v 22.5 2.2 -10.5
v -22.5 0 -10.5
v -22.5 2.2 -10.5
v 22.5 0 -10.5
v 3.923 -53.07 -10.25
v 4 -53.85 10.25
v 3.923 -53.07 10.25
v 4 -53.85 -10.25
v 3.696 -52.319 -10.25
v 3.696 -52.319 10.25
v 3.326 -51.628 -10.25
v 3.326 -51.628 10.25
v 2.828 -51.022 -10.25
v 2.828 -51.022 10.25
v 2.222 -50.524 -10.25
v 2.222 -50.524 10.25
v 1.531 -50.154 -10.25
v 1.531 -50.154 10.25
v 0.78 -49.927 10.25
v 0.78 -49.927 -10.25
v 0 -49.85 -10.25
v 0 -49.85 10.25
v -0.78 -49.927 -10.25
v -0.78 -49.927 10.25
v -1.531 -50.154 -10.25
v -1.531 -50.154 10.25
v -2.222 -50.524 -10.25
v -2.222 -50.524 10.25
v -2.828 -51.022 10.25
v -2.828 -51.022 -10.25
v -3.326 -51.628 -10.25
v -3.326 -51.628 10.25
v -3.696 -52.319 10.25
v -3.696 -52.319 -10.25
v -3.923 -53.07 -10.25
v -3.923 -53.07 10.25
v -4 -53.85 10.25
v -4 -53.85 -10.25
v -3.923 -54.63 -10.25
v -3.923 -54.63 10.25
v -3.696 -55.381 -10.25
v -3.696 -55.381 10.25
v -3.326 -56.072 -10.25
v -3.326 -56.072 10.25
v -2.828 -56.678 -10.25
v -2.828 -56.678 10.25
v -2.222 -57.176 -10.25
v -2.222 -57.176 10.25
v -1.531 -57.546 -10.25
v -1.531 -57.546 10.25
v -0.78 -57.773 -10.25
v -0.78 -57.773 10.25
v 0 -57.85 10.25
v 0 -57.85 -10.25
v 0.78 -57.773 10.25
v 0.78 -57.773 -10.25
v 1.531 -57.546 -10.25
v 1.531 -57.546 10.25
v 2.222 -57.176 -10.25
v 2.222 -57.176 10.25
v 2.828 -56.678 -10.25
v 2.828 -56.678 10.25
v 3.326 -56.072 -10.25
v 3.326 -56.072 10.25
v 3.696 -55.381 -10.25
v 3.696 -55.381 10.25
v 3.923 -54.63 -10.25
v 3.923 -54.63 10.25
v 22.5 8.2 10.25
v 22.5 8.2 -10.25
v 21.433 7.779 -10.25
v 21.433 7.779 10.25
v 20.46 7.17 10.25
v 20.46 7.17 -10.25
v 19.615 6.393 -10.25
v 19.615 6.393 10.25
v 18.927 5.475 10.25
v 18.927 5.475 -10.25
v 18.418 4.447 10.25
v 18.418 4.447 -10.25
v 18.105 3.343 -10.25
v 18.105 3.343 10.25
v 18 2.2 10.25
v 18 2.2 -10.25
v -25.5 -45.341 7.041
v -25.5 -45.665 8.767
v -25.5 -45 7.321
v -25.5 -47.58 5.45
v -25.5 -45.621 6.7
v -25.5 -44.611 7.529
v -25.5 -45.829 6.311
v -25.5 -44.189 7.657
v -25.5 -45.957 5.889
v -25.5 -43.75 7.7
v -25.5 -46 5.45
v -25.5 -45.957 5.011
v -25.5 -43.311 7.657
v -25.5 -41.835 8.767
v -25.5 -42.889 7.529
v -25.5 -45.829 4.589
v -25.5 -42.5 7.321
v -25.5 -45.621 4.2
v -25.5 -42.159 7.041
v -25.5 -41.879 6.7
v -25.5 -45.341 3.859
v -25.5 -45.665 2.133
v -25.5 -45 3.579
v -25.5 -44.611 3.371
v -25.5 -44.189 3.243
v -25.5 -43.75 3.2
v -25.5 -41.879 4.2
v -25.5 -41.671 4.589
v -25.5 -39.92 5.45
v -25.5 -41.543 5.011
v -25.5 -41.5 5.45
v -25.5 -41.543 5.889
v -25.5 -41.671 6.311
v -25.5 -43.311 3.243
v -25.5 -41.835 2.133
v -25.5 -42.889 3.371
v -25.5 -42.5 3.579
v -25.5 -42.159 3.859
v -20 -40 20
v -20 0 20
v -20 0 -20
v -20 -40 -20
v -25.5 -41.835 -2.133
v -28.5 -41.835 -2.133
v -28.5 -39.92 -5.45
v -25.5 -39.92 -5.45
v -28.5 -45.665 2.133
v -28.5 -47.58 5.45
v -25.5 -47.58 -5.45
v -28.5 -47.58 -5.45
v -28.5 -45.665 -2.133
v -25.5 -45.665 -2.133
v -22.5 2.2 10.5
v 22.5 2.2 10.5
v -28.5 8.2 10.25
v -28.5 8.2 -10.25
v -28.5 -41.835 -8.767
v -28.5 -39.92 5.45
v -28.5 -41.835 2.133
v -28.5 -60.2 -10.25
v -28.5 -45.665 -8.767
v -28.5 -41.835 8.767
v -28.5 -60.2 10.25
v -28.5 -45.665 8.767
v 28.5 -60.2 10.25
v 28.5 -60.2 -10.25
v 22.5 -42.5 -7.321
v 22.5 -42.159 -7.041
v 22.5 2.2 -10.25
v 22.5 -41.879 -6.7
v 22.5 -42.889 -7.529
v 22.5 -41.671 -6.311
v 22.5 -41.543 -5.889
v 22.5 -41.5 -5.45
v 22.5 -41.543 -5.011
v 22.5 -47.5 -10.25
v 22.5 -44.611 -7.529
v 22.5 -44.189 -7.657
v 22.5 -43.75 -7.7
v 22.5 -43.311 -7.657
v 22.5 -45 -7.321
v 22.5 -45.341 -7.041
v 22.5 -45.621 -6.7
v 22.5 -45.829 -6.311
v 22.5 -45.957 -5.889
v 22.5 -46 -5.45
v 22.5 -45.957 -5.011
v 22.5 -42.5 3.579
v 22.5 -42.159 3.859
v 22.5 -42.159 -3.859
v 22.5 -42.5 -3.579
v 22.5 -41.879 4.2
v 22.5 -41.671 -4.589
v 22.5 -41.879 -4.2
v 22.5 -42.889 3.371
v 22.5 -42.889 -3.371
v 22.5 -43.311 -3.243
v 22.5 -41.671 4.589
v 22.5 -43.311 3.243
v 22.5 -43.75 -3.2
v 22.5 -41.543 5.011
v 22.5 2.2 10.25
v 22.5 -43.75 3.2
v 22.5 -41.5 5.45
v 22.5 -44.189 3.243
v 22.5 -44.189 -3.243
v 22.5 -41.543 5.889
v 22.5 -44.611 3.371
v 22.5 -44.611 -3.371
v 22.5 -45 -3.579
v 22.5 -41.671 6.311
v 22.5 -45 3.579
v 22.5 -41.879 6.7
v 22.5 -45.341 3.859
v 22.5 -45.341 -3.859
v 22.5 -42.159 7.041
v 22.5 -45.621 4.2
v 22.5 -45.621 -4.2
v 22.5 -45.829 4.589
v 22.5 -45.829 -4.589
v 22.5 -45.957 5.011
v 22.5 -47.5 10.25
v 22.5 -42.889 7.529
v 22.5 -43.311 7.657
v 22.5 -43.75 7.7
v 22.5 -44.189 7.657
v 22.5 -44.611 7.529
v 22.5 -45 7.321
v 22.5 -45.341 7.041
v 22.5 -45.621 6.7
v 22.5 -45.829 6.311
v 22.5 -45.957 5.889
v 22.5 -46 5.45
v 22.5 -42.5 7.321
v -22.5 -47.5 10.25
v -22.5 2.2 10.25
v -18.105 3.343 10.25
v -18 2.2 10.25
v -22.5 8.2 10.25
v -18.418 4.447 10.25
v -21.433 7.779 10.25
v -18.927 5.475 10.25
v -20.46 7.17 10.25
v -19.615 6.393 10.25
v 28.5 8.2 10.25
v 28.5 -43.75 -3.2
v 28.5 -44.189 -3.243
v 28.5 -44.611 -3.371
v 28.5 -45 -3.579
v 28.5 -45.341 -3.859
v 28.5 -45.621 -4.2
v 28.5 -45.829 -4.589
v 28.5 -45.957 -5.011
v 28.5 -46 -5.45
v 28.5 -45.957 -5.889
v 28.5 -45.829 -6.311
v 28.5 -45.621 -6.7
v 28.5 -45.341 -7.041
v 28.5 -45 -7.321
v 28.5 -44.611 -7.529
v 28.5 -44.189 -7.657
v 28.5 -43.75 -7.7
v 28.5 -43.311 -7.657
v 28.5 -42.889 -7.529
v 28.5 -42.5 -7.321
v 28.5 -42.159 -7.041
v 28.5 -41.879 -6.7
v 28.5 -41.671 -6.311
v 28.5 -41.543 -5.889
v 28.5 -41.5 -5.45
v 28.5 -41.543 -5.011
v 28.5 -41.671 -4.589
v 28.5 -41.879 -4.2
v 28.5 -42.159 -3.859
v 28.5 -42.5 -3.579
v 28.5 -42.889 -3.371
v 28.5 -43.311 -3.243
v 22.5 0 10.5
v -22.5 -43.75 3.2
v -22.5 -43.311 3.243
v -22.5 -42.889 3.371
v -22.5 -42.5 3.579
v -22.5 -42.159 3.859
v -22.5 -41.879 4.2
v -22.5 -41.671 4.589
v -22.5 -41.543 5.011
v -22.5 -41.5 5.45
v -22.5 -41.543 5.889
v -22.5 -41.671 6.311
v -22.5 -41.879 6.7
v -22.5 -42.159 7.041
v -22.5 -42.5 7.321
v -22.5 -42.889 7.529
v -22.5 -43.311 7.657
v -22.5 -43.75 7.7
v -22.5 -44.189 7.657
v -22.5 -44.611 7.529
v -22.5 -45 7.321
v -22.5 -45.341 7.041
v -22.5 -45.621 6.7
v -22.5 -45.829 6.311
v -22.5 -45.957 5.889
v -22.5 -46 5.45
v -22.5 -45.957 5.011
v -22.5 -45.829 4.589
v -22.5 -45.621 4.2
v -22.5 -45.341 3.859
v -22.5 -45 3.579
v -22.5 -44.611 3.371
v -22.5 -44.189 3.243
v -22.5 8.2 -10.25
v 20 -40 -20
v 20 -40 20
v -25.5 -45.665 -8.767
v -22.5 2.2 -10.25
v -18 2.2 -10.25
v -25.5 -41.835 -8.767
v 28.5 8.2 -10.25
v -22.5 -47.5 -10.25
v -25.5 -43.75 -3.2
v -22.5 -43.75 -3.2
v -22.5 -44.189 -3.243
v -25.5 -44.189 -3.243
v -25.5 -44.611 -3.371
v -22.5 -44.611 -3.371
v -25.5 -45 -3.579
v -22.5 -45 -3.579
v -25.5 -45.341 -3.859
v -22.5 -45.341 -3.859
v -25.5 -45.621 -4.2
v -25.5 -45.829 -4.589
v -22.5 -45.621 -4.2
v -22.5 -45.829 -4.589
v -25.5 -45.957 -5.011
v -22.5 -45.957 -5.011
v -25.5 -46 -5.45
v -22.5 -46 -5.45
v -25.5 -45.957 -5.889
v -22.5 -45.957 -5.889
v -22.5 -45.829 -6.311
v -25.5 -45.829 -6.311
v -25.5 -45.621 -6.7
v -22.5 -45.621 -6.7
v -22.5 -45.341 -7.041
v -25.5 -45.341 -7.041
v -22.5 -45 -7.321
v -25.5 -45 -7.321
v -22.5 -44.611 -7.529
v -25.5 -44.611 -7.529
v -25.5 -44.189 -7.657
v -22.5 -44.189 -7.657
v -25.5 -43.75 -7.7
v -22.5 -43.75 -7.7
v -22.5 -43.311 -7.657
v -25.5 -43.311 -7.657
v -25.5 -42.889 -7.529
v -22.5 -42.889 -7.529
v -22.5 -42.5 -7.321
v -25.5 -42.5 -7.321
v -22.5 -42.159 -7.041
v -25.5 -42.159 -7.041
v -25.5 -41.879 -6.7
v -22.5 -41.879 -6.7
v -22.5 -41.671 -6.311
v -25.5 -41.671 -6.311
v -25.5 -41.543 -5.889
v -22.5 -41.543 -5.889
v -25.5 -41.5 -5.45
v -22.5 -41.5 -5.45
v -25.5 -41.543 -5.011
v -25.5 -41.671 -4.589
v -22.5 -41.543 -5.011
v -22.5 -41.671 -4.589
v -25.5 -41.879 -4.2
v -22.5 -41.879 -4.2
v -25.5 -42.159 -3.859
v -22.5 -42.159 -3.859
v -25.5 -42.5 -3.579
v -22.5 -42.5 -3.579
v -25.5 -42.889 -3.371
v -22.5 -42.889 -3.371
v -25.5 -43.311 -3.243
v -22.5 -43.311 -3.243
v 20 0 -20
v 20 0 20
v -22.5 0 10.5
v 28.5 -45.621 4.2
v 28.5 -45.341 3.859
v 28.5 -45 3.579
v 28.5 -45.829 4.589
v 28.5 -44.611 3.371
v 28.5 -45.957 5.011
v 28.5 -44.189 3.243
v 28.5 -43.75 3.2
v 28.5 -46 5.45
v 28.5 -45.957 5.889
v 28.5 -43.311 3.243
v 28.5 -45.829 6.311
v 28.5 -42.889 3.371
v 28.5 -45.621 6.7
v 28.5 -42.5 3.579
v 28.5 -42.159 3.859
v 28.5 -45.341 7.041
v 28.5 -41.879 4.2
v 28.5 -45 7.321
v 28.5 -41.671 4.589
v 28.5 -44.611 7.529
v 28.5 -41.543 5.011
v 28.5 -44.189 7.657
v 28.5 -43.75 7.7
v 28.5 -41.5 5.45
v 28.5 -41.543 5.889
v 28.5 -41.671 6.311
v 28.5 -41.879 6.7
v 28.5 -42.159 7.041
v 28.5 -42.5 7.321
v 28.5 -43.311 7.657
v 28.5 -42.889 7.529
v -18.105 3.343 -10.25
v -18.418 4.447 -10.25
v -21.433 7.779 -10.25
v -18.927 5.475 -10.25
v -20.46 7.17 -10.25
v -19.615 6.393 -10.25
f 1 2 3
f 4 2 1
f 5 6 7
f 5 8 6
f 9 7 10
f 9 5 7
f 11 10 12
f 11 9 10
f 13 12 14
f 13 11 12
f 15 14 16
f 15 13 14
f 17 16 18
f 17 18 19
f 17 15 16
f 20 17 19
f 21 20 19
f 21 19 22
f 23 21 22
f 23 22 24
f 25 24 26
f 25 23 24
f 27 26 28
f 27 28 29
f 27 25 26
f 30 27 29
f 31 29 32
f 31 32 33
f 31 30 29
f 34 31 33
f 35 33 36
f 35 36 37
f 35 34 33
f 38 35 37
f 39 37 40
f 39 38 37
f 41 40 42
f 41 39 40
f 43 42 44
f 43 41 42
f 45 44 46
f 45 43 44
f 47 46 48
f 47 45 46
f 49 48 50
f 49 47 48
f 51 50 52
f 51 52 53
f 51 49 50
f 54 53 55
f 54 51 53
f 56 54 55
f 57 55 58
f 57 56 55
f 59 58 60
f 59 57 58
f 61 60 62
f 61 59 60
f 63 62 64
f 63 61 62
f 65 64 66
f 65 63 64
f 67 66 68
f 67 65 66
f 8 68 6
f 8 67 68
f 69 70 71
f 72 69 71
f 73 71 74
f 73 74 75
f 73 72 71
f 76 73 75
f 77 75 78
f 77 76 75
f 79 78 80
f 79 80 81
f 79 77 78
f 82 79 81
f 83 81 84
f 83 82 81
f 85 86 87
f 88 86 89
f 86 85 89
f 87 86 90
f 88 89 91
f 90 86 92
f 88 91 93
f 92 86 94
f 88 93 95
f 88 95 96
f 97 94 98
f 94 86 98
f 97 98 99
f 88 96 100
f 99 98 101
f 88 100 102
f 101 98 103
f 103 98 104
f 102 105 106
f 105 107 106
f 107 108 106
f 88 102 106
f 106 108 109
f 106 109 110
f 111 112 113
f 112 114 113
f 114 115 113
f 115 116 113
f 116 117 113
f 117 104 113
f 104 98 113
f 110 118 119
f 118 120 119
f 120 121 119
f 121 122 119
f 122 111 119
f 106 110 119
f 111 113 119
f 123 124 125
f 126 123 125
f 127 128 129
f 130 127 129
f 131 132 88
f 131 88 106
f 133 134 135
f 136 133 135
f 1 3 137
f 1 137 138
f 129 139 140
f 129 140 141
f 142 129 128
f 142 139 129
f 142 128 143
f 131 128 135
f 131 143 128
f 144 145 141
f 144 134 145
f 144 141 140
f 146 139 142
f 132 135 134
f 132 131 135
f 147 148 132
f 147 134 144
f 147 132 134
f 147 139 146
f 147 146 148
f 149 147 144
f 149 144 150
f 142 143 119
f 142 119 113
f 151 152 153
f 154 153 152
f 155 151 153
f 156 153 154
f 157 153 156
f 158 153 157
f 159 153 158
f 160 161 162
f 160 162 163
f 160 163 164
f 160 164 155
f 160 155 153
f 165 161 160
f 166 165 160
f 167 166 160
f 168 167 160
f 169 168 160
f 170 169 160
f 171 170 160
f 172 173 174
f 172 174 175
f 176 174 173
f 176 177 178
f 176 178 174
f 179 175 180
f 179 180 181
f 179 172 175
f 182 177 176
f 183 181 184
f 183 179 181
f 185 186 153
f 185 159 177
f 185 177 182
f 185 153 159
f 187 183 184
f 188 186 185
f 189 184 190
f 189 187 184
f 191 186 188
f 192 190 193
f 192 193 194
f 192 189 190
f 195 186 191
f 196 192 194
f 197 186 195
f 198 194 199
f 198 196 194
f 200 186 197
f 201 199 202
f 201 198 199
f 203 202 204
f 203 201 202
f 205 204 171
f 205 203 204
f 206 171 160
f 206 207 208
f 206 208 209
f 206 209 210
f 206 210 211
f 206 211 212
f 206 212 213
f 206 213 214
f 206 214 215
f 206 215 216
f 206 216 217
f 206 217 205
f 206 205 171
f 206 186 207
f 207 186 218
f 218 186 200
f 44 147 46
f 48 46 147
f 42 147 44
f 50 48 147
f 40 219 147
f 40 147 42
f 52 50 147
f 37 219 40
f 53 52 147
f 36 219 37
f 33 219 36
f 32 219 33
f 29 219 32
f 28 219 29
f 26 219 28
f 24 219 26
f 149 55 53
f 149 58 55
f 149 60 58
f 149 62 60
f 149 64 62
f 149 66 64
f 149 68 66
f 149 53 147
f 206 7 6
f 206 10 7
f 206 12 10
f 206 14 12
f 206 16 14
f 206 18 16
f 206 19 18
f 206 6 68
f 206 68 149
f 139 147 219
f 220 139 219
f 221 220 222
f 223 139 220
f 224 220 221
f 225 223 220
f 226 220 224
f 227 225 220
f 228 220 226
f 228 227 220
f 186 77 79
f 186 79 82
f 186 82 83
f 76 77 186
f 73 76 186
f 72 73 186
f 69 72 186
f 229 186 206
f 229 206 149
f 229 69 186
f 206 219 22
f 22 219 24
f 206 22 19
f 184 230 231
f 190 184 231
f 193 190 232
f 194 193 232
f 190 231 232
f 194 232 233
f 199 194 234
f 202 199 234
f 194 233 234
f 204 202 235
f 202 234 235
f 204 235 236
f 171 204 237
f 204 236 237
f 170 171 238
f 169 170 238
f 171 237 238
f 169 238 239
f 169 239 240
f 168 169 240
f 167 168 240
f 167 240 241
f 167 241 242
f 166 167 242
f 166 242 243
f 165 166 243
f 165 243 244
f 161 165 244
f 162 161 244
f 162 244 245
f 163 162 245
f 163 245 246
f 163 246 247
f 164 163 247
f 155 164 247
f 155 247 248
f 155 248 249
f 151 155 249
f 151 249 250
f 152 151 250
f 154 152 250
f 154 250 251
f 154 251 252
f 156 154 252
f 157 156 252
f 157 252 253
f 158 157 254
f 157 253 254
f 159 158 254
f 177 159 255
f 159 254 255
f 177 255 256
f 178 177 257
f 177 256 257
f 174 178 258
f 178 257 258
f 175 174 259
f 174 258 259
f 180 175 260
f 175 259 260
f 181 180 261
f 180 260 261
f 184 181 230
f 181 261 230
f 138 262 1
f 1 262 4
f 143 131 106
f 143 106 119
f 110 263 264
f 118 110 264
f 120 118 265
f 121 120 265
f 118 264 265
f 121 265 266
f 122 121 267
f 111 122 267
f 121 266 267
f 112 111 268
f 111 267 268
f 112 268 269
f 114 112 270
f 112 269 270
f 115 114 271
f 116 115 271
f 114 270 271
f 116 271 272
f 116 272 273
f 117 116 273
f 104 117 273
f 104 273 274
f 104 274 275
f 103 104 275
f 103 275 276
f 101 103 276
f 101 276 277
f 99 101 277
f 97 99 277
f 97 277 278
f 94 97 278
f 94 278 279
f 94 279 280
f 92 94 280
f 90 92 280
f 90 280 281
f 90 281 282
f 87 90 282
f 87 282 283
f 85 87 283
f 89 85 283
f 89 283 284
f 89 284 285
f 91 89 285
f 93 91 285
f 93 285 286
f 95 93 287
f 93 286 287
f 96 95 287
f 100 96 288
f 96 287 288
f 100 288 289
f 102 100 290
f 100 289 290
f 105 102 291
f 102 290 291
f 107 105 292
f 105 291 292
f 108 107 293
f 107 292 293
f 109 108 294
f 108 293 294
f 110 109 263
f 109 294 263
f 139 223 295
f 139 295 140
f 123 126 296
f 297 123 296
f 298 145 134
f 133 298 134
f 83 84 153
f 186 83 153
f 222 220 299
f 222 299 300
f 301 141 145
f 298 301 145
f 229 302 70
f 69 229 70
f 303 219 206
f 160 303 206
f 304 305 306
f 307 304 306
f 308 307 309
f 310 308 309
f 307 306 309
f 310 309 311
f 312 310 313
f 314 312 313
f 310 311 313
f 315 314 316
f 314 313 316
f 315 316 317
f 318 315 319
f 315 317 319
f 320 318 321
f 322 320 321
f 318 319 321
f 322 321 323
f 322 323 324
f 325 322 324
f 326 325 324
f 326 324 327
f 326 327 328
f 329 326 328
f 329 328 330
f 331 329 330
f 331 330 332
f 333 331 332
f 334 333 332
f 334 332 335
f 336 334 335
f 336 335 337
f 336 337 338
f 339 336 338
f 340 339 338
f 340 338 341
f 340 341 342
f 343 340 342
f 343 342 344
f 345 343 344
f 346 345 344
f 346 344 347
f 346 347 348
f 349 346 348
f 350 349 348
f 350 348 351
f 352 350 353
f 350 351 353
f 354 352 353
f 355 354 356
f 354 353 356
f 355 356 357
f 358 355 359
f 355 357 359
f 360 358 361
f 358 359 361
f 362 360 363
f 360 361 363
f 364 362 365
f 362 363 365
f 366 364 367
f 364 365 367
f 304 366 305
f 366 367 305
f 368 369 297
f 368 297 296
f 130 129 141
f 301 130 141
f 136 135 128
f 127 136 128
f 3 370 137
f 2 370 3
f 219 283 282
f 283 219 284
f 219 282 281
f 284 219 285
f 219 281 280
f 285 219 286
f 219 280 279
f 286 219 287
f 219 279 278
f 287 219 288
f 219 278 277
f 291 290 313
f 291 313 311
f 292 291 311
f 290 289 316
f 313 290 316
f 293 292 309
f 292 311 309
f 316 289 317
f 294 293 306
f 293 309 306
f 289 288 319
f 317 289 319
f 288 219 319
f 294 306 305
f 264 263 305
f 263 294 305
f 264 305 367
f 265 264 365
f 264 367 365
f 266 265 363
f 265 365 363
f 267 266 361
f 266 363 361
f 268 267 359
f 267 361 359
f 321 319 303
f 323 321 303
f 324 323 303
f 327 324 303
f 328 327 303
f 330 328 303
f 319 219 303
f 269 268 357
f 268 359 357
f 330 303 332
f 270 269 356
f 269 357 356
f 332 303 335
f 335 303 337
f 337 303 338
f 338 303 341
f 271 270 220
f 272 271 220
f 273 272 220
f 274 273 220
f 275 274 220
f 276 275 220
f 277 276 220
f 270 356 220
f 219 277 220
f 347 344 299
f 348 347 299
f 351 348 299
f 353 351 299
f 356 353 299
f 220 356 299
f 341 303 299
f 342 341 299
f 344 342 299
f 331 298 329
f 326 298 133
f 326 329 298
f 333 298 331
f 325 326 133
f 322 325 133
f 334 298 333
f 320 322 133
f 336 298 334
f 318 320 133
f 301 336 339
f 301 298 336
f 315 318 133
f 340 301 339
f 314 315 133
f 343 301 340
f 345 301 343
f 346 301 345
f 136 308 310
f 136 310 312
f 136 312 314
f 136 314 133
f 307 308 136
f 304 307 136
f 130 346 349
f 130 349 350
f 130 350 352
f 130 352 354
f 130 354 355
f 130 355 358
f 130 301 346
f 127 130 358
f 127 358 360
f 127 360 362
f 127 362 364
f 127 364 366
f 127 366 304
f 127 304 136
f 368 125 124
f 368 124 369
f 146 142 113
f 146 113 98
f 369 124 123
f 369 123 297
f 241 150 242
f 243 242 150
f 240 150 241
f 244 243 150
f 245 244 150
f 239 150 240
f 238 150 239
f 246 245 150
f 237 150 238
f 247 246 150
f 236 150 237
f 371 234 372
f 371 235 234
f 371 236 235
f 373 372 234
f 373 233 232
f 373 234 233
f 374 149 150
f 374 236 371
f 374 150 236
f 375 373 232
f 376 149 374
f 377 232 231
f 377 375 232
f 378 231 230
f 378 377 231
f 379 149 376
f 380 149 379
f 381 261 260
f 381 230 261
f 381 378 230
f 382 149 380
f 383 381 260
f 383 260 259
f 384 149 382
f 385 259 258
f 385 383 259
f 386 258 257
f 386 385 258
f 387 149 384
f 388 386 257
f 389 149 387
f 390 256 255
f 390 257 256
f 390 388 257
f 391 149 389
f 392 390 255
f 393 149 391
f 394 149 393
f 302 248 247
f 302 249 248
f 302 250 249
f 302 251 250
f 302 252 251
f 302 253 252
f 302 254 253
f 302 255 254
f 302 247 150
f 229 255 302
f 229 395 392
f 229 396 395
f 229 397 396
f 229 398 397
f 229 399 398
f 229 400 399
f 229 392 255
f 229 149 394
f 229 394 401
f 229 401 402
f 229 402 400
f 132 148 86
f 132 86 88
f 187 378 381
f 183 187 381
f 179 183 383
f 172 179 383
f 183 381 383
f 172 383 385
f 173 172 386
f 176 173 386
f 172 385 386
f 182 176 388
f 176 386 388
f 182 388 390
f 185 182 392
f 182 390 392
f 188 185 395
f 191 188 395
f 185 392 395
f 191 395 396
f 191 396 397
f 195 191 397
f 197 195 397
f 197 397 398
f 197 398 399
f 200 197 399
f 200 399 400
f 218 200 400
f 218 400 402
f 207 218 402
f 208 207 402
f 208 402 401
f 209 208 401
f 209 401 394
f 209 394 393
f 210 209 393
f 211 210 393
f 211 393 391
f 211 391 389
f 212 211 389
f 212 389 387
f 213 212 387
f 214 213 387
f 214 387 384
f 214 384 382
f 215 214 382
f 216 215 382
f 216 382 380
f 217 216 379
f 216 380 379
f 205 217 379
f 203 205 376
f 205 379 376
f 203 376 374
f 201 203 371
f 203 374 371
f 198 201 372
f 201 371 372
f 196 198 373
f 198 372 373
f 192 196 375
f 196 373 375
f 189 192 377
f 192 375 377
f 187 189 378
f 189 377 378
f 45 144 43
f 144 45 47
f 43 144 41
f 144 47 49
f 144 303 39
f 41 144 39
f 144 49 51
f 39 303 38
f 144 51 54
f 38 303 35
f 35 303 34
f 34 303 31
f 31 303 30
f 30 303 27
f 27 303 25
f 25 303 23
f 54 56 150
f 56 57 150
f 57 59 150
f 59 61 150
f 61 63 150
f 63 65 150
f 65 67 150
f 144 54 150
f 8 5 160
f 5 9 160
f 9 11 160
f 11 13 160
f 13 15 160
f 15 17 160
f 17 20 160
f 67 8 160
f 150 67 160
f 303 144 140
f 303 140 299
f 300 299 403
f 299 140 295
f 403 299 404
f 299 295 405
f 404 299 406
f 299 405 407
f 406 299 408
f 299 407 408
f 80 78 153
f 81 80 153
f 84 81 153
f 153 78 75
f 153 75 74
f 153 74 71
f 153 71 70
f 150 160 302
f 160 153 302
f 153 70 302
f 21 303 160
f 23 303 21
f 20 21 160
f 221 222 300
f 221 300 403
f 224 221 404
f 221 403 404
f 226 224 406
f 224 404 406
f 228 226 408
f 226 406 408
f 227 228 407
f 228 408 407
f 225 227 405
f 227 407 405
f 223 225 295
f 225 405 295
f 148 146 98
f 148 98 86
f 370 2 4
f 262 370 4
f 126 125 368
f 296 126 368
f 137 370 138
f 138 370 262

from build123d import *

# Parameters (mm, degrees)
SKETCH1_W                            = 45
SKETCH1_H                            = 21
BOSS_EXTRUDE1_DEPTH                  = 2.2
SKETCH2_W                            = 40
SKETCH2_H                            = 40
BOSS_EXTRUDE2_DEPTH                  = 40
SKETCH3_W                            = 45
SKETCH3_H                            = 12.7
SKETCH3_R                            = 4
SNAPFIT_41MM_SPACING_4MM_WIDTH_DEPTH = 10.25
SKETCH4_R                            = 2.25
CUT_EXTRUDE1_DEPTH                   = 86.282120049
BOLTCLAMPP_WIDTH_6MM_DEPTH           = 3


with BuildPart() as part:
    # Sketch1 → Boss-Extrude1 (new body)
    with BuildSketch(Plane(origin=(0, 0, 0), x_dir=(1, 0, 0), z_dir=(0, 1, 0))):
        Rectangle(SKETCH1_W, SKETCH1_H)
    extrude(amount=BOSS_EXTRUDE1_DEPTH)


with BuildPart() as body_2:
    # Sketch2 → Boss-Extrude2 (new body)
    with BuildSketch(Plane(origin=(0, 0, 0), x_dir=(1, 0, 0), z_dir=(0, 1, 0))):
        Rectangle(SKETCH2_W, SKETCH2_H)
    extrude(amount=-BOSS_EXTRUDE2_DEPTH)


with BuildPart() as body_3:
    # Sketch3 → SnapFit-41mm_spacing-4mm_width (new, symmetric)
    # profile 1 of 3: a face of its own
    with BuildSketch(Plane.XY):
        with Locations((0, -53.85)):
            Rectangle(SKETCH3_W, SKETCH3_H)
        with Locations((0, -53.85)):
            Circle(SKETCH3_R, mode=Mode.SUBTRACT)
    # profile 2 of 3: a face of its own
    with BuildSketch(Plane.XY):
        with BuildLine():
            Line((-28.5, -60.2), (-22.5, -60.2))
            Line((-22.5, -60.2), (-22.5, -47.5))
            Line((-22.5, -47.5), (-22.5, 0))
            Line((-22.5, 0), (-22.5, 2.2))
            Line((-22.5, 2.2), (-18, 2.2))
            ThreePointArc((-18, 2.2), (-19.25, 5.95), (-22.5, 8.2))
            Line((-22.5, 8.2), (-28.5, 8.2))
            Line((-28.5, 8.2), (-28.5, 0))
            Line((-28.5, 0), (-28.5, -60.2))
        make_face()
    # profile 3 of 3: a face of its own
    with BuildSketch(Plane.XY):
        with BuildLine():
            Line((22.5, -47.5), (22.5, -60.2))
            Line((22.5, -60.2), (28.5, -60.2))
            Line((28.5, -60.2), (28.5, 0))
            Line((28.5, 0), (28.5, 8.2))
            Line((28.5, 8.2), (22.5, 8.2))
            ThreePointArc((22.5, 8.2), (19.25, 5.95), (18, 2.2))
            Line((18, 2.2), (22.5, 2.2))
            Line((22.5, 2.2), (22.5, 0))
            Line((22.5, 0), (22.5, -47.5))
        make_face()
    extrude(amount=SNAPFIT_41MM_SPACING_4MM_WIDTH_DEPTH, both=True)

    # Sketch4 → Cut-Extrude1 (cut, through all)
    with BuildSketch(Plane(origin=(28.5, 0, 0), x_dir=(0, 0, -1), z_dir=(1, 0, 0))):
        with Locations((-5.45, -43.75)):
            Circle(SKETCH4_R)
        with Locations(Location((5.45, -43.75, 0), (0, 0, 180))):
            Circle(SKETCH4_R)
    extrude(amount=-CUT_EXTRUDE1_DEPTH, mode=Mode.SUBTRACT)

    # Sketch5 → BoltClampP-width_6mm (cut)
    with BuildSketch(Plane.ZY.offset(28.5)):
        Polygon((-8.766877296, -41.835), (-8.766877296, -45.665), (-5.45, -47.58), (-2.133122704, -45.665), (-2.133122704, -41.835), (-5.45, -39.92), align=None)
        Polygon((8.766877296, -45.665), (5.45, -47.58), (2.133122704, -45.665), (2.133122704, -41.835), (5.45, -39.92), (8.766877296, -41.835), align=None)
    extrude(amount=-BOLTCLAMPP_WIDTH_6MM_DEPTH, mode=Mode.SUBTRACT)


solid = Compound([part.part, body_2.part, body_3.part])
